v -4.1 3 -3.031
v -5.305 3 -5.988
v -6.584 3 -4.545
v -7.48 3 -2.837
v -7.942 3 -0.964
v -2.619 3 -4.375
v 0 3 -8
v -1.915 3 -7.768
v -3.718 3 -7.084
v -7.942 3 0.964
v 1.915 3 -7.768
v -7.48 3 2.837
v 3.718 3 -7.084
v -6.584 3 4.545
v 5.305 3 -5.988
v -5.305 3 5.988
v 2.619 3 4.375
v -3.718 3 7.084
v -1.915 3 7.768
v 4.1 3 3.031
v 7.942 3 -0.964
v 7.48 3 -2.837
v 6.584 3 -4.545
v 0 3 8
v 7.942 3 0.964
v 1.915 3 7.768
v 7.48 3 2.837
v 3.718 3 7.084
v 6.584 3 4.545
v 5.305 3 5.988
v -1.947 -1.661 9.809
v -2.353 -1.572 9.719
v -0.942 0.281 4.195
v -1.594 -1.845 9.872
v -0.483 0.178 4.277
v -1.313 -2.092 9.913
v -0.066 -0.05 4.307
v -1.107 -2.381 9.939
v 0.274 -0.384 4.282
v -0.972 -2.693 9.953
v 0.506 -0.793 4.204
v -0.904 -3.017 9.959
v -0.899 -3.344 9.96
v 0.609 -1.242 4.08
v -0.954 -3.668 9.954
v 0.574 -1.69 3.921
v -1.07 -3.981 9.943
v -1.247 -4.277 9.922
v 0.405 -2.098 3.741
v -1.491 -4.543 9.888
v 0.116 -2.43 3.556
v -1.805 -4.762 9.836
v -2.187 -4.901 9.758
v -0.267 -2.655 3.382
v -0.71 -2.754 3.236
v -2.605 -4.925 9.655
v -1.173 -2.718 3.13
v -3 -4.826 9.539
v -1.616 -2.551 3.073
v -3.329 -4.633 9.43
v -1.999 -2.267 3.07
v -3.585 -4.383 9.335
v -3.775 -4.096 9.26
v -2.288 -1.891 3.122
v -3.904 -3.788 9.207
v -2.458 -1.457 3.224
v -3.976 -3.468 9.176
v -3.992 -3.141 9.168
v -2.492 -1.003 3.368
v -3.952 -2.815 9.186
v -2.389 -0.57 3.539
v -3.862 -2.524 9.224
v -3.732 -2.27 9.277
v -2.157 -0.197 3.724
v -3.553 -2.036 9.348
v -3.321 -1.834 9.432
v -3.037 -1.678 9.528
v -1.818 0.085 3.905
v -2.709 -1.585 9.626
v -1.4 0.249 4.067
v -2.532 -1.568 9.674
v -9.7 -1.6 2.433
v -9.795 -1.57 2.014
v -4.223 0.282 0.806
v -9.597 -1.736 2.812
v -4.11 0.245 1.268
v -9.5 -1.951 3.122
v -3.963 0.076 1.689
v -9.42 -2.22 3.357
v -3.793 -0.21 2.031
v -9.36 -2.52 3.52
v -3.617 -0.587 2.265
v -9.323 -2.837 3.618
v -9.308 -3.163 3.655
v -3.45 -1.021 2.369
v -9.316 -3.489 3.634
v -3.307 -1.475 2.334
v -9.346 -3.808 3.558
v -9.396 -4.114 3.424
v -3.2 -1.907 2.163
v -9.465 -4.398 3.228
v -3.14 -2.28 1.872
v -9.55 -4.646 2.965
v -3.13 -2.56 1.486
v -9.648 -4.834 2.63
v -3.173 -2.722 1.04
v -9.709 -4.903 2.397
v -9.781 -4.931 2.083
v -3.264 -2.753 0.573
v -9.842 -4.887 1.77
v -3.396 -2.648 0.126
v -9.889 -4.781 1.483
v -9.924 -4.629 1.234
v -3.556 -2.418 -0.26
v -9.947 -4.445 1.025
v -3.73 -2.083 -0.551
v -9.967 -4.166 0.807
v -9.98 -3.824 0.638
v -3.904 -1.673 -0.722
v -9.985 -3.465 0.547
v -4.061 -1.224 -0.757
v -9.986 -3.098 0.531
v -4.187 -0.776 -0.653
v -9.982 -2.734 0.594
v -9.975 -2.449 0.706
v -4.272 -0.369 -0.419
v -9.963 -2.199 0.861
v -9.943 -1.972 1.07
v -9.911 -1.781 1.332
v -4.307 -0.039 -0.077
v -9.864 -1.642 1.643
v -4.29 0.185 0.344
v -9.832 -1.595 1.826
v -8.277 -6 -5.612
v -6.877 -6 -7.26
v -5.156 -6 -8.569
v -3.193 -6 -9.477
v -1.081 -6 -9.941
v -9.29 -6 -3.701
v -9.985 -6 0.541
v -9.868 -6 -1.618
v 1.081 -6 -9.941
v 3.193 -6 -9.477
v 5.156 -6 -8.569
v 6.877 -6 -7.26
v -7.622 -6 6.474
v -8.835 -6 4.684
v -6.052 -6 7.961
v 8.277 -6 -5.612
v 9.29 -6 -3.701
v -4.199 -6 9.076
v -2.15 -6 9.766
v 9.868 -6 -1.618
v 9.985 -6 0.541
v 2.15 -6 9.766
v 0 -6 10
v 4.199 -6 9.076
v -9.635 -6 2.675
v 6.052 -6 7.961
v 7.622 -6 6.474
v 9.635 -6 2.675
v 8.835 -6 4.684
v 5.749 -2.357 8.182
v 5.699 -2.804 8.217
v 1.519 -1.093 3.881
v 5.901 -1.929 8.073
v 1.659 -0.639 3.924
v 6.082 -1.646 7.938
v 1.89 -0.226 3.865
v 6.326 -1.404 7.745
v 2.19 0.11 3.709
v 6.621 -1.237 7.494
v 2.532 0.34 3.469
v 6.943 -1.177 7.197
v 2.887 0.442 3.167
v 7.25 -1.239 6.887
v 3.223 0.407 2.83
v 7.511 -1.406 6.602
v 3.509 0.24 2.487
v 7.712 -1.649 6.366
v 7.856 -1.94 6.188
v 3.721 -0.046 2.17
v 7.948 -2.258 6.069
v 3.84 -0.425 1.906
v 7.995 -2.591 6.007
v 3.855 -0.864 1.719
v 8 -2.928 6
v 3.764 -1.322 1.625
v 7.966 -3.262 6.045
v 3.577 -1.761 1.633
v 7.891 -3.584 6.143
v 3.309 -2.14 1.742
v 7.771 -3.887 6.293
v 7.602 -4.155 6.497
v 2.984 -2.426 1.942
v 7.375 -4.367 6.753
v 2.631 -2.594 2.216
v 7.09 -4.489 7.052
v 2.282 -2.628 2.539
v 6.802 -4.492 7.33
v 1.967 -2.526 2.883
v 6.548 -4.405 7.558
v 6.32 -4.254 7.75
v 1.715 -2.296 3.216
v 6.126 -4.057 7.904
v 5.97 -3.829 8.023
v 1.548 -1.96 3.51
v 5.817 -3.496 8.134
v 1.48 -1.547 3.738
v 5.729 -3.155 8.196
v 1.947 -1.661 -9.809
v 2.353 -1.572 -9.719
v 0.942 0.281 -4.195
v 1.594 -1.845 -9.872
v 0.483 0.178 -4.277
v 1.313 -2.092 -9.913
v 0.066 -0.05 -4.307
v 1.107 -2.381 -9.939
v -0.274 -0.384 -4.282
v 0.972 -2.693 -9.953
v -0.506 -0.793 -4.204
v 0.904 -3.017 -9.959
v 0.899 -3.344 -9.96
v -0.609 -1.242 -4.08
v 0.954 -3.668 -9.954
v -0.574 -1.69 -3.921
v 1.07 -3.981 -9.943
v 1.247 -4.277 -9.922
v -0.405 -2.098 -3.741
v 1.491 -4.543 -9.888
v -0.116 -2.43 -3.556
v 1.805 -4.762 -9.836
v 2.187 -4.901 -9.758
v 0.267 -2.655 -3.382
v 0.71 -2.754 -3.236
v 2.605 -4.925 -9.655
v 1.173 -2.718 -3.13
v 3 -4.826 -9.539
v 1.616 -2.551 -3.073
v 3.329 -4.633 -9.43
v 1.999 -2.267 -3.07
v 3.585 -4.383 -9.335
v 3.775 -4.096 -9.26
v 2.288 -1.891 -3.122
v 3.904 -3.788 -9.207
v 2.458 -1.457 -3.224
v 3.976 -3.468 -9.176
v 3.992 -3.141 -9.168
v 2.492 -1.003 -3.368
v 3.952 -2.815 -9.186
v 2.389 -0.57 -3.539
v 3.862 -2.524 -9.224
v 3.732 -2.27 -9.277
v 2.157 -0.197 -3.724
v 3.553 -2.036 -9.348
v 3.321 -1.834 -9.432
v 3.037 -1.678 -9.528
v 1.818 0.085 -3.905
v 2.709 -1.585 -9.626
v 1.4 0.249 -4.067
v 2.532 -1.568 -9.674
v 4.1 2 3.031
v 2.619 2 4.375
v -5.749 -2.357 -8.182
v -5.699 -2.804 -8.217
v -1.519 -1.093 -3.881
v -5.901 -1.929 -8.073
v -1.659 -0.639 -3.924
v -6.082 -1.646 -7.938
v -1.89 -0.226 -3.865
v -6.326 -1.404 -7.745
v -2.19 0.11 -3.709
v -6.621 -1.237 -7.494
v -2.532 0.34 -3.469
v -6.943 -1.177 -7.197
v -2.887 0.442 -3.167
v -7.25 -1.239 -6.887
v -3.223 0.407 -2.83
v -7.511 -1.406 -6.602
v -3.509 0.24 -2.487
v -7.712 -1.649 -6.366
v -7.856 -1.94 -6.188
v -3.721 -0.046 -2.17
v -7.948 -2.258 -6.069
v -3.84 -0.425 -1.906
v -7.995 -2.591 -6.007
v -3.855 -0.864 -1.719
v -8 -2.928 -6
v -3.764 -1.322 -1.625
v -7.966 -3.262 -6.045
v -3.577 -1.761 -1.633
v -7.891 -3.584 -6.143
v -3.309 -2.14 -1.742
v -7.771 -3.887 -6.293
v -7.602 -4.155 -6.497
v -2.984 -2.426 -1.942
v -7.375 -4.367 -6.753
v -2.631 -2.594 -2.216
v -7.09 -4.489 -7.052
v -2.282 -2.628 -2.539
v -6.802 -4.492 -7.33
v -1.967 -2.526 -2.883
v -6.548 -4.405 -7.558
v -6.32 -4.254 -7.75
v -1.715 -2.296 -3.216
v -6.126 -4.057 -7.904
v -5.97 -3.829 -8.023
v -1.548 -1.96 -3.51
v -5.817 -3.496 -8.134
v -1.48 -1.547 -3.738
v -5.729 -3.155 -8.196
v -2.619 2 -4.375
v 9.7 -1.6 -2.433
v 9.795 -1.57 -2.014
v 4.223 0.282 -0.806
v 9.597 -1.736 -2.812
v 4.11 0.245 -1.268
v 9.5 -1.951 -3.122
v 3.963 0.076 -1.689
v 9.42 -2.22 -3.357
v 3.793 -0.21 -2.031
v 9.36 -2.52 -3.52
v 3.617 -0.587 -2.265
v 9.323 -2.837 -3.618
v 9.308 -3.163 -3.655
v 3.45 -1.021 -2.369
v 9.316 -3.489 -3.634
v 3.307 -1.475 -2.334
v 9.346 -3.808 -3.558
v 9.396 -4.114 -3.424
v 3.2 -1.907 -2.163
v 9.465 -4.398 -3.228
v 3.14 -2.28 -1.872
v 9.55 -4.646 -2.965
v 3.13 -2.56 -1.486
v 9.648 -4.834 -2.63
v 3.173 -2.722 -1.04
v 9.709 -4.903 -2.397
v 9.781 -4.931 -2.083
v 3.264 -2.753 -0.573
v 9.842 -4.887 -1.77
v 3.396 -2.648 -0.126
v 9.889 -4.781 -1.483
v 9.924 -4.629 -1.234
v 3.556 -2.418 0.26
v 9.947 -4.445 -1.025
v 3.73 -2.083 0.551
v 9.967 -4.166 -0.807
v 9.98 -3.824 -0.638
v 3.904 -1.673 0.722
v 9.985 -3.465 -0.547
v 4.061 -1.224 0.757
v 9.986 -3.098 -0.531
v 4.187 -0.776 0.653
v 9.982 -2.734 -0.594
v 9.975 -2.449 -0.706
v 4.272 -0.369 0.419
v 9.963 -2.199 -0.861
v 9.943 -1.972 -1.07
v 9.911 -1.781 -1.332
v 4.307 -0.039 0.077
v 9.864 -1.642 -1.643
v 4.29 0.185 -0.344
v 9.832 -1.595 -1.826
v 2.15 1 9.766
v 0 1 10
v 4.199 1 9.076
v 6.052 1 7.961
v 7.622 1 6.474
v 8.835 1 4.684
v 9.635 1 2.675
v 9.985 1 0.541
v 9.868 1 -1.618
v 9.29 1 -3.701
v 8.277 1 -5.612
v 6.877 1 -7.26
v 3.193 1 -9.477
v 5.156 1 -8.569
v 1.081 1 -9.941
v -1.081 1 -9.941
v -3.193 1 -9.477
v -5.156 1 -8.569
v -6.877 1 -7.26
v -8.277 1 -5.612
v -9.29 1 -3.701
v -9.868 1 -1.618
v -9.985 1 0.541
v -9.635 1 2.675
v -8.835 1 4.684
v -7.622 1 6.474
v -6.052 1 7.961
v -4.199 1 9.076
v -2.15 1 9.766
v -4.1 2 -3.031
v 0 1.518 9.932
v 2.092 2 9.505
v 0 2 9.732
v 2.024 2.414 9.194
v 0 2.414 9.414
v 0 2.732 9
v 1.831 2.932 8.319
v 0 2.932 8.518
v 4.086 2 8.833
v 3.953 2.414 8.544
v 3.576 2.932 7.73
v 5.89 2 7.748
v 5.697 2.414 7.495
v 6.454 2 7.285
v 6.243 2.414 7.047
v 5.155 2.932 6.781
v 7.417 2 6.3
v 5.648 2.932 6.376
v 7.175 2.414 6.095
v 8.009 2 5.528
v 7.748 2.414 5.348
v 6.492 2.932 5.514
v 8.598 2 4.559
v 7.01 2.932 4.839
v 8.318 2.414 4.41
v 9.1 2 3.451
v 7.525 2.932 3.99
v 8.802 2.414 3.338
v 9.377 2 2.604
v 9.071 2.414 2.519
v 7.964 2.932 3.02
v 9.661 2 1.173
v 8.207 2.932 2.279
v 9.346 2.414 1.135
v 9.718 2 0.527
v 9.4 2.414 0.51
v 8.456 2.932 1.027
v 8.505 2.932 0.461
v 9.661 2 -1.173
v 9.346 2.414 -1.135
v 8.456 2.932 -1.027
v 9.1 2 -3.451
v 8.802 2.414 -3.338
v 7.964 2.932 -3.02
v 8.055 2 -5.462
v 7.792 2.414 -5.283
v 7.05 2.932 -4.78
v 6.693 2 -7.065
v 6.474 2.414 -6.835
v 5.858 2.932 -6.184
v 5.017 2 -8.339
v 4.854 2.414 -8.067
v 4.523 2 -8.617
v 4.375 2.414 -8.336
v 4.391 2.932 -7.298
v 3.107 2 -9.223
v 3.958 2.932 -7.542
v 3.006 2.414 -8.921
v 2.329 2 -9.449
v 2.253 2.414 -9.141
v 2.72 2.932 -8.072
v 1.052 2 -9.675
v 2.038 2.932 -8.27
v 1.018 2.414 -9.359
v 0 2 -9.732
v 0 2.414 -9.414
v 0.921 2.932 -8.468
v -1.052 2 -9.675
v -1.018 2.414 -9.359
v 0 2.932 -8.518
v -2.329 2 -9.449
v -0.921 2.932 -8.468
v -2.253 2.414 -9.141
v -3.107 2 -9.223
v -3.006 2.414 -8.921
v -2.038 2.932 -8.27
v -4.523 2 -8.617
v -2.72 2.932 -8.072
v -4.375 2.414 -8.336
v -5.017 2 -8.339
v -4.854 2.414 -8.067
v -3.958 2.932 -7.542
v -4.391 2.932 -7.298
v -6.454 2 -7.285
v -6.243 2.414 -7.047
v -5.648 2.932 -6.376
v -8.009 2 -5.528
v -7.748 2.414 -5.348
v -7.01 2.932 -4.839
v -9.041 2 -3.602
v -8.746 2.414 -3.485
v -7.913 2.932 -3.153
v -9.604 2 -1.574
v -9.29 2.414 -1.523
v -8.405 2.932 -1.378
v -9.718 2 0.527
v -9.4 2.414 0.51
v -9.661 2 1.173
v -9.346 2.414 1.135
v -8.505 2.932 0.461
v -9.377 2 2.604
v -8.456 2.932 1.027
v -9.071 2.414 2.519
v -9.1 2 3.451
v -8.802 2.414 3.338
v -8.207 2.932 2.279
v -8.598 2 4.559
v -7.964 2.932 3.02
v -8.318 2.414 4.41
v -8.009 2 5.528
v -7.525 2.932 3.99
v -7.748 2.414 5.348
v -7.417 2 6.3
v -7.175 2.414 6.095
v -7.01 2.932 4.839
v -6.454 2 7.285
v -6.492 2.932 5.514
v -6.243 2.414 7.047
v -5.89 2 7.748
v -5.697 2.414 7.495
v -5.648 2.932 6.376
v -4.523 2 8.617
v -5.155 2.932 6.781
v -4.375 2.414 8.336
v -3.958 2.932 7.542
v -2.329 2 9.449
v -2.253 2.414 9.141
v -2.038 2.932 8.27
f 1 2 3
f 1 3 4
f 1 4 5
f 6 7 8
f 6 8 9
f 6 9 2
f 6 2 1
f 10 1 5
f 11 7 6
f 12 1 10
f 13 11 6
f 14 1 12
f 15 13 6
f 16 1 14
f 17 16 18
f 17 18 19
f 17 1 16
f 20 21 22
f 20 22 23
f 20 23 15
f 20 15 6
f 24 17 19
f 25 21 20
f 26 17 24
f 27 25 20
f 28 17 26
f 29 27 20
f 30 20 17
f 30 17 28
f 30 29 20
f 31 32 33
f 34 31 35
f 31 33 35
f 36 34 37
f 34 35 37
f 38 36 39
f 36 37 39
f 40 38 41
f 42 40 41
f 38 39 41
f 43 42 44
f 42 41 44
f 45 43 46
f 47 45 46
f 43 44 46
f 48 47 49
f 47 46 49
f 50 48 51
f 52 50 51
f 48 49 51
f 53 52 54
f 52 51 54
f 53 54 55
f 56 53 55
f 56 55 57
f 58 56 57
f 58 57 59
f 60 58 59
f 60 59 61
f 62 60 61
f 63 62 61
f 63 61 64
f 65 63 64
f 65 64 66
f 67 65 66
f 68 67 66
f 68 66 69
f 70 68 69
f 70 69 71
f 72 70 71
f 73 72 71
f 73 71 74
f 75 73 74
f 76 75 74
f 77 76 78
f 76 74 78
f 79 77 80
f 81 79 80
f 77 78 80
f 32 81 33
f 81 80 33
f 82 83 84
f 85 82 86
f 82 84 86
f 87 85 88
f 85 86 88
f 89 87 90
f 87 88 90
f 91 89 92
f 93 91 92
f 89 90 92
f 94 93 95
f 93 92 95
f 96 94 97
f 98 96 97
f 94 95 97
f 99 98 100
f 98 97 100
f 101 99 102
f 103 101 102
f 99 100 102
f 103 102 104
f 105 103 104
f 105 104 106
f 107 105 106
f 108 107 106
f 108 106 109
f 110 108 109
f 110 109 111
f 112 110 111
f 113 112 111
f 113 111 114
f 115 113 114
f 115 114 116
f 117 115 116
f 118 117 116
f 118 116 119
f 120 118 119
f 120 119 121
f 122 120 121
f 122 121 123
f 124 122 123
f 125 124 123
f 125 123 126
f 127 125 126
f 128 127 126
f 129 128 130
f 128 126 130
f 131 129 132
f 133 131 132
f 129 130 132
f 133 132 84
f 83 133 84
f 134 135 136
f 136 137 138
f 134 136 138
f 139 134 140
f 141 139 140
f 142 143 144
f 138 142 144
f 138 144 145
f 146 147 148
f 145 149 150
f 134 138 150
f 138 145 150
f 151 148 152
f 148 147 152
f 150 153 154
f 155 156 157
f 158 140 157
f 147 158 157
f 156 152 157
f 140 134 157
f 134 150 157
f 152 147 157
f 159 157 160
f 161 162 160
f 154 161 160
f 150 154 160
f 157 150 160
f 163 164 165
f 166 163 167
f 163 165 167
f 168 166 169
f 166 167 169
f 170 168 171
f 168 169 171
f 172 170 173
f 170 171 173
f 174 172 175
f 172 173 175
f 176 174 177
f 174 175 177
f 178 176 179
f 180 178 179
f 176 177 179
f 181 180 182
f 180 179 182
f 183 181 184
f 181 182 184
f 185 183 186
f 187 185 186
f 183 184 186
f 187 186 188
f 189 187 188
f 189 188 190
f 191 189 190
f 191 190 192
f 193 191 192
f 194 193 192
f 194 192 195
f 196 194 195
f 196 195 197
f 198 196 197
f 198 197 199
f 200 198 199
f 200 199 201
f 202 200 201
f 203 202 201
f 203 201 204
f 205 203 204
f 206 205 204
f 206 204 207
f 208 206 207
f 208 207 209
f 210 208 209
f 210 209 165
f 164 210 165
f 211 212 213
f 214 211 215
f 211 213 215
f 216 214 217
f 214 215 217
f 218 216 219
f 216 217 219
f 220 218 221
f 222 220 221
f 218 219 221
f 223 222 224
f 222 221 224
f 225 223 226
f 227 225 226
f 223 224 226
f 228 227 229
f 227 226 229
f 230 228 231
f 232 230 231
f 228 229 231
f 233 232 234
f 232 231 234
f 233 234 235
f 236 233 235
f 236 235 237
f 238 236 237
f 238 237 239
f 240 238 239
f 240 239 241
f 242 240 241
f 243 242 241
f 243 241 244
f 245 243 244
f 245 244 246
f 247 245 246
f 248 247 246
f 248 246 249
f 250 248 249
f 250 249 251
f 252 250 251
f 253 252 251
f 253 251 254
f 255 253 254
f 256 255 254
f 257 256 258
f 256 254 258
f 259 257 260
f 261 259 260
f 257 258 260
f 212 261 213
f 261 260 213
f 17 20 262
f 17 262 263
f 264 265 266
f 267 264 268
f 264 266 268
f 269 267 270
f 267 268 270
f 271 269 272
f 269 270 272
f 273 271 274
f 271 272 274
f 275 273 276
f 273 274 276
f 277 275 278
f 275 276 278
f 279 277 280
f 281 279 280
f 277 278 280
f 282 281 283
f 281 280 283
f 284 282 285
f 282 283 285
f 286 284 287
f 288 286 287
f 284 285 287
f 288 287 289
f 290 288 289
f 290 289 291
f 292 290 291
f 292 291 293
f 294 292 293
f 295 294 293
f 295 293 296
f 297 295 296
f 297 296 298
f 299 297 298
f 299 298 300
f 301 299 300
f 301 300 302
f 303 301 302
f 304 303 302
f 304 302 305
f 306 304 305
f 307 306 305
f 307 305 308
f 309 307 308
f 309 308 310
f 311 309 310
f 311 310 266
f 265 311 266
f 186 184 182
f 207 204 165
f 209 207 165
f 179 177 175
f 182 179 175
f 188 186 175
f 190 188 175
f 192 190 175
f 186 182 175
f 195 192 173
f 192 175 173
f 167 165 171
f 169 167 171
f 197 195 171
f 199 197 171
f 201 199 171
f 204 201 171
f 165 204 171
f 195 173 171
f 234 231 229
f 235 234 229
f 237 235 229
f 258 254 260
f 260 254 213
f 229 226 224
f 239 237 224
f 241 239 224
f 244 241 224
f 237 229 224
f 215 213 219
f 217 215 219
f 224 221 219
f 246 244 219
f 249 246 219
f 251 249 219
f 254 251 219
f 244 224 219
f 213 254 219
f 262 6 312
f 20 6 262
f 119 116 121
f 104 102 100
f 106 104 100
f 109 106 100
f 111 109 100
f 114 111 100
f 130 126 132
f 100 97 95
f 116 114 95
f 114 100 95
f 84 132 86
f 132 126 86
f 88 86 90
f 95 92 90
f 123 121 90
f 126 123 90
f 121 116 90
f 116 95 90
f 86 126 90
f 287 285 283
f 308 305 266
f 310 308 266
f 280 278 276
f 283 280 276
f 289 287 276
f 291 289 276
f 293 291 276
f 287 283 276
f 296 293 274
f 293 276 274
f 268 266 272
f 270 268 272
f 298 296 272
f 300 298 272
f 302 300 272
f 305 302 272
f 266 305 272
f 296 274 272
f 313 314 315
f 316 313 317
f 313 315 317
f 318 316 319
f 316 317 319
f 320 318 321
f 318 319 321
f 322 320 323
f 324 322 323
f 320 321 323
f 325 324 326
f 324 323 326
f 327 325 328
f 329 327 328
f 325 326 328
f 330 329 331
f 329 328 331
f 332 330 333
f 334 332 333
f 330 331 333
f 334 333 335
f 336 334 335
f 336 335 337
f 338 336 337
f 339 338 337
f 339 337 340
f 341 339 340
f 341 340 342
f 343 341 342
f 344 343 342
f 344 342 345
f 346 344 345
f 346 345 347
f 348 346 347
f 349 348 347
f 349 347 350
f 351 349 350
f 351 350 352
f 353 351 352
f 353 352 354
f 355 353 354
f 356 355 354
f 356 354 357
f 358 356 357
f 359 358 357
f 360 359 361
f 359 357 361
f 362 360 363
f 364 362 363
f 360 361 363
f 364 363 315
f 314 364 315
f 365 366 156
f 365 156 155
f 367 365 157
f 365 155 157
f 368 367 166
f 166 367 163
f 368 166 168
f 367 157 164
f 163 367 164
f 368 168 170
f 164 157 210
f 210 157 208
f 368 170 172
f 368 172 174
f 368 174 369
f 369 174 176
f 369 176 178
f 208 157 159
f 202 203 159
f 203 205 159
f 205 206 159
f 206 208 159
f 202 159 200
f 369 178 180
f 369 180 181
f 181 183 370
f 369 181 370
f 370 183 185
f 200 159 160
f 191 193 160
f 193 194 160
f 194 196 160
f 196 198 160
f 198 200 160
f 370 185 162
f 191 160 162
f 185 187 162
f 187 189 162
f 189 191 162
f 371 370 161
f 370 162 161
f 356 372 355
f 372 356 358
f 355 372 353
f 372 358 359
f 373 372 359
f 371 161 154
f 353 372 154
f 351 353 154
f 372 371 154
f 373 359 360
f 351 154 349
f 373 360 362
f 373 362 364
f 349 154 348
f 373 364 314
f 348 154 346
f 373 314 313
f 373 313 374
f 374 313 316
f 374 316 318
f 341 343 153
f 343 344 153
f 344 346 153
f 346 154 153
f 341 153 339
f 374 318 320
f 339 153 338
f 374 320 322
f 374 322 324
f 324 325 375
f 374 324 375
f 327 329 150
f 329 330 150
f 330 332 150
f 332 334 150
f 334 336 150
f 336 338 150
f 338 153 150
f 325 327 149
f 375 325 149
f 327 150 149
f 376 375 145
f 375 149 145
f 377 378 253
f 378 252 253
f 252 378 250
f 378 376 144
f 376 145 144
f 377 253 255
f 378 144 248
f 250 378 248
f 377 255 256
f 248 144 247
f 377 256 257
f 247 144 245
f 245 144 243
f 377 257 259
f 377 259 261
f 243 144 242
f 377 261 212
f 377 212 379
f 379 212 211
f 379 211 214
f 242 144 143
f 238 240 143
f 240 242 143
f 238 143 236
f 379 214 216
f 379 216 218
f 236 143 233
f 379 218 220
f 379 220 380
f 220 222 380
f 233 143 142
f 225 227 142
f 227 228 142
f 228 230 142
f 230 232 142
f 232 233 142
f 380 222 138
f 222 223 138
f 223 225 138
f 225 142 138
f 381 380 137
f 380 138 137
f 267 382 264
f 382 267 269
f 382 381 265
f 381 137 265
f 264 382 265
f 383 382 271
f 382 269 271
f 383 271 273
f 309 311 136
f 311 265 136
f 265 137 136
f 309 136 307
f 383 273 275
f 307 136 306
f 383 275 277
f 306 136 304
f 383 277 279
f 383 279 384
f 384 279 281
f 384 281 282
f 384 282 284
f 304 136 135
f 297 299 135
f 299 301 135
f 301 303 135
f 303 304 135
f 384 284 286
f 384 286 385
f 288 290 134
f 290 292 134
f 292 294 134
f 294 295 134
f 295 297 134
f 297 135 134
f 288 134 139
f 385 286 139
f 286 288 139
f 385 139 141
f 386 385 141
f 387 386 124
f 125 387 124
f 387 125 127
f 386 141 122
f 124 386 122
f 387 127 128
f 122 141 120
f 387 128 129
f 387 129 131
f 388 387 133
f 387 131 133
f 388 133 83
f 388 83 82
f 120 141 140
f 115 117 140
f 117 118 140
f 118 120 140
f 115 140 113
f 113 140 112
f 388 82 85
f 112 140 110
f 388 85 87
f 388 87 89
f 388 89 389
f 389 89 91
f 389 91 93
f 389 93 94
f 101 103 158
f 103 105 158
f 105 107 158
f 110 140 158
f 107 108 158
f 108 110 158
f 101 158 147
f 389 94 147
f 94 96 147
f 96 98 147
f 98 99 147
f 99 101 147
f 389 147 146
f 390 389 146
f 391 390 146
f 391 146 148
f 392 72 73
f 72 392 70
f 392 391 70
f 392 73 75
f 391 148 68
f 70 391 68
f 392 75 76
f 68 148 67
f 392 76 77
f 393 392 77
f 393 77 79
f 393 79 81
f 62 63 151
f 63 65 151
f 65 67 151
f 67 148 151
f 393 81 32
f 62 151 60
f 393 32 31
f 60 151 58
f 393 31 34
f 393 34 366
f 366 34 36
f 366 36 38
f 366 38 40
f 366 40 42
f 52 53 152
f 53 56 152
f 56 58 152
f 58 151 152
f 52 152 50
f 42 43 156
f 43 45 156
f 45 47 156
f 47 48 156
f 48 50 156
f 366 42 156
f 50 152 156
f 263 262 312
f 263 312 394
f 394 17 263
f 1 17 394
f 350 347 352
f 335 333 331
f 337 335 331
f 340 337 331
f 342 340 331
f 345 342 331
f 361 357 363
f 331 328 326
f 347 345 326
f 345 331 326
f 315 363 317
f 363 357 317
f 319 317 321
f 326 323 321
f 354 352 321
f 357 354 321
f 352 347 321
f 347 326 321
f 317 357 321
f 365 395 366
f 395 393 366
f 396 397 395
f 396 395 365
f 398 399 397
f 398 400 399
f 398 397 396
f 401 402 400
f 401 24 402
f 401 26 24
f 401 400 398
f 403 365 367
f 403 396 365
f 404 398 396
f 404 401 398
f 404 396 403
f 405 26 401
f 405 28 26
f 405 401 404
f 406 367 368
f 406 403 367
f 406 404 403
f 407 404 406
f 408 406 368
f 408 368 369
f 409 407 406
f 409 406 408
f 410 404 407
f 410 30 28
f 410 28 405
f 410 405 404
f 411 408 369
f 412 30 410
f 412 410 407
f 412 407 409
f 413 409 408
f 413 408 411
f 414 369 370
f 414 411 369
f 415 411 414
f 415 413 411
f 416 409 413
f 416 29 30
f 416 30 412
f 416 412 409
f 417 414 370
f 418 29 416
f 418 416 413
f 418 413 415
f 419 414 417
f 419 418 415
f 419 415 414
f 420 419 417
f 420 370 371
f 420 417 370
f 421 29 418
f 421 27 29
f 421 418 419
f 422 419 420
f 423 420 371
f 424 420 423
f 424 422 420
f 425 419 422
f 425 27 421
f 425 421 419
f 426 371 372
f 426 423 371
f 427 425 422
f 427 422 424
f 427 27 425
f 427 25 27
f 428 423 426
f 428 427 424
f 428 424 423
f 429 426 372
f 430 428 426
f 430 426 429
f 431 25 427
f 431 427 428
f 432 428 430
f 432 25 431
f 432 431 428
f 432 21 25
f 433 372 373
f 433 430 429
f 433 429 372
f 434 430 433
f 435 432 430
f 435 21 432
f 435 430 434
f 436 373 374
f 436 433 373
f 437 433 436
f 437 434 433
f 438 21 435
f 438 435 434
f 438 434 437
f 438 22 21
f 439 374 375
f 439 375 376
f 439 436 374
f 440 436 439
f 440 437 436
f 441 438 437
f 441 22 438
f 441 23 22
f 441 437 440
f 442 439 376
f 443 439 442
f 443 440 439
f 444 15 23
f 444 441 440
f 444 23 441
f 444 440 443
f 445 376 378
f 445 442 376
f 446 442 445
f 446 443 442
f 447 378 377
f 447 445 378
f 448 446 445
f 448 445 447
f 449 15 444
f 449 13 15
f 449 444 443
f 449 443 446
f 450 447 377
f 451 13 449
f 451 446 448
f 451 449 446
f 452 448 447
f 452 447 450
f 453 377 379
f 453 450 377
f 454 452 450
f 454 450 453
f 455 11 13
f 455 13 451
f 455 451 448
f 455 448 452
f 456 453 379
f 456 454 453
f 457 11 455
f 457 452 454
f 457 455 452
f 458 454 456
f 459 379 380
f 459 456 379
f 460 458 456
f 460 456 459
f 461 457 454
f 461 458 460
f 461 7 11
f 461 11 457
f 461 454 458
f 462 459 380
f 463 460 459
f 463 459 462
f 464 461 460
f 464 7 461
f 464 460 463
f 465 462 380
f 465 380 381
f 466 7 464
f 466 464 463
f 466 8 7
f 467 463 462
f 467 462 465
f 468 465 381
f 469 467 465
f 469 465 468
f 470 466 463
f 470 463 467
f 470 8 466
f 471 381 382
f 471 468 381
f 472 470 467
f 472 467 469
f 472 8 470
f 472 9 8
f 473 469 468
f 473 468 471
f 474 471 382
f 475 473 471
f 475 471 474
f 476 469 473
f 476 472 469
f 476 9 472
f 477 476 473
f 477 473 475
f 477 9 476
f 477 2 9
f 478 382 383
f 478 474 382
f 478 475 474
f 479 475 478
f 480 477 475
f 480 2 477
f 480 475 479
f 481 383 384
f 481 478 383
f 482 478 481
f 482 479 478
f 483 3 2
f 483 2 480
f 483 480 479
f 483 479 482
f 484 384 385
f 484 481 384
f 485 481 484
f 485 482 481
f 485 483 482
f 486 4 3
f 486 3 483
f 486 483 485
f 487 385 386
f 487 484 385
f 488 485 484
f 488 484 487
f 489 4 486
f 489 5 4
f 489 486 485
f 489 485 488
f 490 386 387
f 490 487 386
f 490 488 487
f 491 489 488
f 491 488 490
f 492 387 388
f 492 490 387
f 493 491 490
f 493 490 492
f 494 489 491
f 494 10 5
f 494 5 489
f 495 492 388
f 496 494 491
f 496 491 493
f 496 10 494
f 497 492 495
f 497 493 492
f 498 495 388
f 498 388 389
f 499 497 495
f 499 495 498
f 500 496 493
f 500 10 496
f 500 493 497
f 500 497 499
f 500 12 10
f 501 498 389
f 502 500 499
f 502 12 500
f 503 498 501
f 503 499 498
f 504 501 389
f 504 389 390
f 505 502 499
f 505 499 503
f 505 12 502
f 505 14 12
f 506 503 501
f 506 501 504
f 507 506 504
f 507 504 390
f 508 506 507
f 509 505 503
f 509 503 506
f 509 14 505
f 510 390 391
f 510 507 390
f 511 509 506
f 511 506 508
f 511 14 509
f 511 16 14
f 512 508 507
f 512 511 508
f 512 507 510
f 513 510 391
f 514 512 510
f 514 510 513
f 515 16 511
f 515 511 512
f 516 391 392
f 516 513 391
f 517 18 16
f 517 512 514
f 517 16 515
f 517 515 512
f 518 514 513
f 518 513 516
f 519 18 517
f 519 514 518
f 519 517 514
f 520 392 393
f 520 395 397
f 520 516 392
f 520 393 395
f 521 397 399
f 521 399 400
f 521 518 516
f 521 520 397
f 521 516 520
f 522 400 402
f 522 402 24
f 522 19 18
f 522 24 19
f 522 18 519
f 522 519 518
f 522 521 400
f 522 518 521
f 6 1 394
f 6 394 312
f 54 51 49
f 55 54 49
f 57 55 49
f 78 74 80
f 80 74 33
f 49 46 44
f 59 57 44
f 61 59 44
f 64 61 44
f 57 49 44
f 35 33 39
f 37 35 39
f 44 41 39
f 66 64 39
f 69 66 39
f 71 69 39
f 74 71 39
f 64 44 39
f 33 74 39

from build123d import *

# Parameters (mm, degrees)
BASE_DEPTH         = 3
BASE_DEPTH_BACK    = 6
SKETCH1_R          = 10
SKETCH2_R          = 1.6
HOLE1_DEPTH        = 19.646604683
HOLE1MIRROR_COUNT  = 2
SKETCH3_R          = 1.6
HOLE2_DEPTH        = 19.158121362
HOLE2MIRROR_COUNT  = 2
SKETCH4_R          = 1.6
HOLE3_DEPTH        = 19.100993715
HOLE3MIRROR_COUNT  = 2
FILLET1_R          = 2
CUT_EXTRUDE1_DEPTH = 1


with BuildPart() as part:
    # Sketch1 → base (new, two sides: drawn at the far end of the back side and taken through both)
    with BuildSketch(Plane(origin=(0, 0, 0), x_dir=(1, 0, 0), z_dir=(0, 1, 0)).offset(-BASE_DEPTH_BACK)):
        Circle(SKETCH1_R)
    extrude(amount=BASE_DEPTH + BASE_DEPTH_BACK)

    # Sketch2 → hole1 (cut, through all)
    with BuildSketch(Plane(origin=(2.670502563, -1.093066116, 2.770130417), x_dir=(-0.6558691872850446, 0.22429081675253856, 0.7207837669443827), z_dir=(-0.6676256406563905, 0.27326652891267483, -0.692532604369038))):
        Circle(SKETCH2_R)
    hole1 = extrude(amount=-HOLE1_DEPTH, mode=Mode.SUBTRACT)

    # hole1mirror: hole1 ×2 about axis
    hole1mirror_axis = Axis((0, 5.5, 0), (0, -1, 0))
    for i in range(1, HOLE1MIRROR_COUNT):
        add(hole1.rotate(hole1mirror_axis, i * 360 / HOLE1MIRROR_COUNT), mode=Mode.SUBTRACT)

    # Sketch3 → hole2 (cut, through all)
    with BuildSketch(Plane(origin=(-0.941672921, -1.236067977, 3.685836142), x_dir=(-0.9718935871364875, 0.07382318789513377, -0.22354639834264944), z_dir=(0.23541823021467095, 0.3090169943749464, -0.921459035481267))):
        Circle(SKETCH3_R)
    hole2 = extrude(amount=-HOLE2_DEPTH, mode=Mode.SUBTRACT)

    # hole2mirror: hole2 ×2 about axis
    hole2mirror_axis = Axis((0, 5.5, 0), (0, -1, 0))
    for i in range(1, HOLE2MIRROR_COUNT):
        add(hole2.rotate(hole2mirror_axis, i * 360 / HOLE2MIRROR_COUNT), mode=Mode.SUBTRACT)

    # Sketch4 → hole3 (cut, through all)
    with BuildSketch(Plane(origin=(-3.717841, -1.236067977, 0.806098168), x_dir=(-0.19123247894507908, -0.06357892752956036, -0.979483465389136), z_dir=(0.9294602499075393, 0.30901699437494623, -0.20152454200243008))):
        Circle(SKETCH4_R)
    hole3 = extrude(amount=-HOLE3_DEPTH, mode=Mode.SUBTRACT)

    # hole3mirror: hole3 ×2 about axis
    hole3mirror_axis = Axis((0, 5.5, 0), (0, -1, 0))
    for i in range(1, HOLE3MIRROR_COUNT):
        add(hole3.rotate(hole3mirror_axis, i * 360 / HOLE3MIRROR_COUNT), mode=Mode.SUBTRACT)

    # Fillet1
    fillet1_edges = [part.edges().sort_by_distance(p)[0] for p in [
        (-10, 3, 0),
    ]]
    fillet(fillet1_edges, radius=FILLET1_R)

    # Sketch6 → Cut-Extrude1 (cut)
    with BuildSketch(Plane(origin=(0, 3, 0), x_dir=(1, 0, 0), z_dir=(0, 1, 0))):
        Polygon((-4.100143947, 3.031306586), (-2.61886111, 4.375107597), (4.100143947, -3.031306586), (2.61886111, -4.375107597), align=None)
    extrude(amount=-CUT_EXTRUDE1_DEPTH, mode=Mode.SUBTRACT)


solid = part.part
